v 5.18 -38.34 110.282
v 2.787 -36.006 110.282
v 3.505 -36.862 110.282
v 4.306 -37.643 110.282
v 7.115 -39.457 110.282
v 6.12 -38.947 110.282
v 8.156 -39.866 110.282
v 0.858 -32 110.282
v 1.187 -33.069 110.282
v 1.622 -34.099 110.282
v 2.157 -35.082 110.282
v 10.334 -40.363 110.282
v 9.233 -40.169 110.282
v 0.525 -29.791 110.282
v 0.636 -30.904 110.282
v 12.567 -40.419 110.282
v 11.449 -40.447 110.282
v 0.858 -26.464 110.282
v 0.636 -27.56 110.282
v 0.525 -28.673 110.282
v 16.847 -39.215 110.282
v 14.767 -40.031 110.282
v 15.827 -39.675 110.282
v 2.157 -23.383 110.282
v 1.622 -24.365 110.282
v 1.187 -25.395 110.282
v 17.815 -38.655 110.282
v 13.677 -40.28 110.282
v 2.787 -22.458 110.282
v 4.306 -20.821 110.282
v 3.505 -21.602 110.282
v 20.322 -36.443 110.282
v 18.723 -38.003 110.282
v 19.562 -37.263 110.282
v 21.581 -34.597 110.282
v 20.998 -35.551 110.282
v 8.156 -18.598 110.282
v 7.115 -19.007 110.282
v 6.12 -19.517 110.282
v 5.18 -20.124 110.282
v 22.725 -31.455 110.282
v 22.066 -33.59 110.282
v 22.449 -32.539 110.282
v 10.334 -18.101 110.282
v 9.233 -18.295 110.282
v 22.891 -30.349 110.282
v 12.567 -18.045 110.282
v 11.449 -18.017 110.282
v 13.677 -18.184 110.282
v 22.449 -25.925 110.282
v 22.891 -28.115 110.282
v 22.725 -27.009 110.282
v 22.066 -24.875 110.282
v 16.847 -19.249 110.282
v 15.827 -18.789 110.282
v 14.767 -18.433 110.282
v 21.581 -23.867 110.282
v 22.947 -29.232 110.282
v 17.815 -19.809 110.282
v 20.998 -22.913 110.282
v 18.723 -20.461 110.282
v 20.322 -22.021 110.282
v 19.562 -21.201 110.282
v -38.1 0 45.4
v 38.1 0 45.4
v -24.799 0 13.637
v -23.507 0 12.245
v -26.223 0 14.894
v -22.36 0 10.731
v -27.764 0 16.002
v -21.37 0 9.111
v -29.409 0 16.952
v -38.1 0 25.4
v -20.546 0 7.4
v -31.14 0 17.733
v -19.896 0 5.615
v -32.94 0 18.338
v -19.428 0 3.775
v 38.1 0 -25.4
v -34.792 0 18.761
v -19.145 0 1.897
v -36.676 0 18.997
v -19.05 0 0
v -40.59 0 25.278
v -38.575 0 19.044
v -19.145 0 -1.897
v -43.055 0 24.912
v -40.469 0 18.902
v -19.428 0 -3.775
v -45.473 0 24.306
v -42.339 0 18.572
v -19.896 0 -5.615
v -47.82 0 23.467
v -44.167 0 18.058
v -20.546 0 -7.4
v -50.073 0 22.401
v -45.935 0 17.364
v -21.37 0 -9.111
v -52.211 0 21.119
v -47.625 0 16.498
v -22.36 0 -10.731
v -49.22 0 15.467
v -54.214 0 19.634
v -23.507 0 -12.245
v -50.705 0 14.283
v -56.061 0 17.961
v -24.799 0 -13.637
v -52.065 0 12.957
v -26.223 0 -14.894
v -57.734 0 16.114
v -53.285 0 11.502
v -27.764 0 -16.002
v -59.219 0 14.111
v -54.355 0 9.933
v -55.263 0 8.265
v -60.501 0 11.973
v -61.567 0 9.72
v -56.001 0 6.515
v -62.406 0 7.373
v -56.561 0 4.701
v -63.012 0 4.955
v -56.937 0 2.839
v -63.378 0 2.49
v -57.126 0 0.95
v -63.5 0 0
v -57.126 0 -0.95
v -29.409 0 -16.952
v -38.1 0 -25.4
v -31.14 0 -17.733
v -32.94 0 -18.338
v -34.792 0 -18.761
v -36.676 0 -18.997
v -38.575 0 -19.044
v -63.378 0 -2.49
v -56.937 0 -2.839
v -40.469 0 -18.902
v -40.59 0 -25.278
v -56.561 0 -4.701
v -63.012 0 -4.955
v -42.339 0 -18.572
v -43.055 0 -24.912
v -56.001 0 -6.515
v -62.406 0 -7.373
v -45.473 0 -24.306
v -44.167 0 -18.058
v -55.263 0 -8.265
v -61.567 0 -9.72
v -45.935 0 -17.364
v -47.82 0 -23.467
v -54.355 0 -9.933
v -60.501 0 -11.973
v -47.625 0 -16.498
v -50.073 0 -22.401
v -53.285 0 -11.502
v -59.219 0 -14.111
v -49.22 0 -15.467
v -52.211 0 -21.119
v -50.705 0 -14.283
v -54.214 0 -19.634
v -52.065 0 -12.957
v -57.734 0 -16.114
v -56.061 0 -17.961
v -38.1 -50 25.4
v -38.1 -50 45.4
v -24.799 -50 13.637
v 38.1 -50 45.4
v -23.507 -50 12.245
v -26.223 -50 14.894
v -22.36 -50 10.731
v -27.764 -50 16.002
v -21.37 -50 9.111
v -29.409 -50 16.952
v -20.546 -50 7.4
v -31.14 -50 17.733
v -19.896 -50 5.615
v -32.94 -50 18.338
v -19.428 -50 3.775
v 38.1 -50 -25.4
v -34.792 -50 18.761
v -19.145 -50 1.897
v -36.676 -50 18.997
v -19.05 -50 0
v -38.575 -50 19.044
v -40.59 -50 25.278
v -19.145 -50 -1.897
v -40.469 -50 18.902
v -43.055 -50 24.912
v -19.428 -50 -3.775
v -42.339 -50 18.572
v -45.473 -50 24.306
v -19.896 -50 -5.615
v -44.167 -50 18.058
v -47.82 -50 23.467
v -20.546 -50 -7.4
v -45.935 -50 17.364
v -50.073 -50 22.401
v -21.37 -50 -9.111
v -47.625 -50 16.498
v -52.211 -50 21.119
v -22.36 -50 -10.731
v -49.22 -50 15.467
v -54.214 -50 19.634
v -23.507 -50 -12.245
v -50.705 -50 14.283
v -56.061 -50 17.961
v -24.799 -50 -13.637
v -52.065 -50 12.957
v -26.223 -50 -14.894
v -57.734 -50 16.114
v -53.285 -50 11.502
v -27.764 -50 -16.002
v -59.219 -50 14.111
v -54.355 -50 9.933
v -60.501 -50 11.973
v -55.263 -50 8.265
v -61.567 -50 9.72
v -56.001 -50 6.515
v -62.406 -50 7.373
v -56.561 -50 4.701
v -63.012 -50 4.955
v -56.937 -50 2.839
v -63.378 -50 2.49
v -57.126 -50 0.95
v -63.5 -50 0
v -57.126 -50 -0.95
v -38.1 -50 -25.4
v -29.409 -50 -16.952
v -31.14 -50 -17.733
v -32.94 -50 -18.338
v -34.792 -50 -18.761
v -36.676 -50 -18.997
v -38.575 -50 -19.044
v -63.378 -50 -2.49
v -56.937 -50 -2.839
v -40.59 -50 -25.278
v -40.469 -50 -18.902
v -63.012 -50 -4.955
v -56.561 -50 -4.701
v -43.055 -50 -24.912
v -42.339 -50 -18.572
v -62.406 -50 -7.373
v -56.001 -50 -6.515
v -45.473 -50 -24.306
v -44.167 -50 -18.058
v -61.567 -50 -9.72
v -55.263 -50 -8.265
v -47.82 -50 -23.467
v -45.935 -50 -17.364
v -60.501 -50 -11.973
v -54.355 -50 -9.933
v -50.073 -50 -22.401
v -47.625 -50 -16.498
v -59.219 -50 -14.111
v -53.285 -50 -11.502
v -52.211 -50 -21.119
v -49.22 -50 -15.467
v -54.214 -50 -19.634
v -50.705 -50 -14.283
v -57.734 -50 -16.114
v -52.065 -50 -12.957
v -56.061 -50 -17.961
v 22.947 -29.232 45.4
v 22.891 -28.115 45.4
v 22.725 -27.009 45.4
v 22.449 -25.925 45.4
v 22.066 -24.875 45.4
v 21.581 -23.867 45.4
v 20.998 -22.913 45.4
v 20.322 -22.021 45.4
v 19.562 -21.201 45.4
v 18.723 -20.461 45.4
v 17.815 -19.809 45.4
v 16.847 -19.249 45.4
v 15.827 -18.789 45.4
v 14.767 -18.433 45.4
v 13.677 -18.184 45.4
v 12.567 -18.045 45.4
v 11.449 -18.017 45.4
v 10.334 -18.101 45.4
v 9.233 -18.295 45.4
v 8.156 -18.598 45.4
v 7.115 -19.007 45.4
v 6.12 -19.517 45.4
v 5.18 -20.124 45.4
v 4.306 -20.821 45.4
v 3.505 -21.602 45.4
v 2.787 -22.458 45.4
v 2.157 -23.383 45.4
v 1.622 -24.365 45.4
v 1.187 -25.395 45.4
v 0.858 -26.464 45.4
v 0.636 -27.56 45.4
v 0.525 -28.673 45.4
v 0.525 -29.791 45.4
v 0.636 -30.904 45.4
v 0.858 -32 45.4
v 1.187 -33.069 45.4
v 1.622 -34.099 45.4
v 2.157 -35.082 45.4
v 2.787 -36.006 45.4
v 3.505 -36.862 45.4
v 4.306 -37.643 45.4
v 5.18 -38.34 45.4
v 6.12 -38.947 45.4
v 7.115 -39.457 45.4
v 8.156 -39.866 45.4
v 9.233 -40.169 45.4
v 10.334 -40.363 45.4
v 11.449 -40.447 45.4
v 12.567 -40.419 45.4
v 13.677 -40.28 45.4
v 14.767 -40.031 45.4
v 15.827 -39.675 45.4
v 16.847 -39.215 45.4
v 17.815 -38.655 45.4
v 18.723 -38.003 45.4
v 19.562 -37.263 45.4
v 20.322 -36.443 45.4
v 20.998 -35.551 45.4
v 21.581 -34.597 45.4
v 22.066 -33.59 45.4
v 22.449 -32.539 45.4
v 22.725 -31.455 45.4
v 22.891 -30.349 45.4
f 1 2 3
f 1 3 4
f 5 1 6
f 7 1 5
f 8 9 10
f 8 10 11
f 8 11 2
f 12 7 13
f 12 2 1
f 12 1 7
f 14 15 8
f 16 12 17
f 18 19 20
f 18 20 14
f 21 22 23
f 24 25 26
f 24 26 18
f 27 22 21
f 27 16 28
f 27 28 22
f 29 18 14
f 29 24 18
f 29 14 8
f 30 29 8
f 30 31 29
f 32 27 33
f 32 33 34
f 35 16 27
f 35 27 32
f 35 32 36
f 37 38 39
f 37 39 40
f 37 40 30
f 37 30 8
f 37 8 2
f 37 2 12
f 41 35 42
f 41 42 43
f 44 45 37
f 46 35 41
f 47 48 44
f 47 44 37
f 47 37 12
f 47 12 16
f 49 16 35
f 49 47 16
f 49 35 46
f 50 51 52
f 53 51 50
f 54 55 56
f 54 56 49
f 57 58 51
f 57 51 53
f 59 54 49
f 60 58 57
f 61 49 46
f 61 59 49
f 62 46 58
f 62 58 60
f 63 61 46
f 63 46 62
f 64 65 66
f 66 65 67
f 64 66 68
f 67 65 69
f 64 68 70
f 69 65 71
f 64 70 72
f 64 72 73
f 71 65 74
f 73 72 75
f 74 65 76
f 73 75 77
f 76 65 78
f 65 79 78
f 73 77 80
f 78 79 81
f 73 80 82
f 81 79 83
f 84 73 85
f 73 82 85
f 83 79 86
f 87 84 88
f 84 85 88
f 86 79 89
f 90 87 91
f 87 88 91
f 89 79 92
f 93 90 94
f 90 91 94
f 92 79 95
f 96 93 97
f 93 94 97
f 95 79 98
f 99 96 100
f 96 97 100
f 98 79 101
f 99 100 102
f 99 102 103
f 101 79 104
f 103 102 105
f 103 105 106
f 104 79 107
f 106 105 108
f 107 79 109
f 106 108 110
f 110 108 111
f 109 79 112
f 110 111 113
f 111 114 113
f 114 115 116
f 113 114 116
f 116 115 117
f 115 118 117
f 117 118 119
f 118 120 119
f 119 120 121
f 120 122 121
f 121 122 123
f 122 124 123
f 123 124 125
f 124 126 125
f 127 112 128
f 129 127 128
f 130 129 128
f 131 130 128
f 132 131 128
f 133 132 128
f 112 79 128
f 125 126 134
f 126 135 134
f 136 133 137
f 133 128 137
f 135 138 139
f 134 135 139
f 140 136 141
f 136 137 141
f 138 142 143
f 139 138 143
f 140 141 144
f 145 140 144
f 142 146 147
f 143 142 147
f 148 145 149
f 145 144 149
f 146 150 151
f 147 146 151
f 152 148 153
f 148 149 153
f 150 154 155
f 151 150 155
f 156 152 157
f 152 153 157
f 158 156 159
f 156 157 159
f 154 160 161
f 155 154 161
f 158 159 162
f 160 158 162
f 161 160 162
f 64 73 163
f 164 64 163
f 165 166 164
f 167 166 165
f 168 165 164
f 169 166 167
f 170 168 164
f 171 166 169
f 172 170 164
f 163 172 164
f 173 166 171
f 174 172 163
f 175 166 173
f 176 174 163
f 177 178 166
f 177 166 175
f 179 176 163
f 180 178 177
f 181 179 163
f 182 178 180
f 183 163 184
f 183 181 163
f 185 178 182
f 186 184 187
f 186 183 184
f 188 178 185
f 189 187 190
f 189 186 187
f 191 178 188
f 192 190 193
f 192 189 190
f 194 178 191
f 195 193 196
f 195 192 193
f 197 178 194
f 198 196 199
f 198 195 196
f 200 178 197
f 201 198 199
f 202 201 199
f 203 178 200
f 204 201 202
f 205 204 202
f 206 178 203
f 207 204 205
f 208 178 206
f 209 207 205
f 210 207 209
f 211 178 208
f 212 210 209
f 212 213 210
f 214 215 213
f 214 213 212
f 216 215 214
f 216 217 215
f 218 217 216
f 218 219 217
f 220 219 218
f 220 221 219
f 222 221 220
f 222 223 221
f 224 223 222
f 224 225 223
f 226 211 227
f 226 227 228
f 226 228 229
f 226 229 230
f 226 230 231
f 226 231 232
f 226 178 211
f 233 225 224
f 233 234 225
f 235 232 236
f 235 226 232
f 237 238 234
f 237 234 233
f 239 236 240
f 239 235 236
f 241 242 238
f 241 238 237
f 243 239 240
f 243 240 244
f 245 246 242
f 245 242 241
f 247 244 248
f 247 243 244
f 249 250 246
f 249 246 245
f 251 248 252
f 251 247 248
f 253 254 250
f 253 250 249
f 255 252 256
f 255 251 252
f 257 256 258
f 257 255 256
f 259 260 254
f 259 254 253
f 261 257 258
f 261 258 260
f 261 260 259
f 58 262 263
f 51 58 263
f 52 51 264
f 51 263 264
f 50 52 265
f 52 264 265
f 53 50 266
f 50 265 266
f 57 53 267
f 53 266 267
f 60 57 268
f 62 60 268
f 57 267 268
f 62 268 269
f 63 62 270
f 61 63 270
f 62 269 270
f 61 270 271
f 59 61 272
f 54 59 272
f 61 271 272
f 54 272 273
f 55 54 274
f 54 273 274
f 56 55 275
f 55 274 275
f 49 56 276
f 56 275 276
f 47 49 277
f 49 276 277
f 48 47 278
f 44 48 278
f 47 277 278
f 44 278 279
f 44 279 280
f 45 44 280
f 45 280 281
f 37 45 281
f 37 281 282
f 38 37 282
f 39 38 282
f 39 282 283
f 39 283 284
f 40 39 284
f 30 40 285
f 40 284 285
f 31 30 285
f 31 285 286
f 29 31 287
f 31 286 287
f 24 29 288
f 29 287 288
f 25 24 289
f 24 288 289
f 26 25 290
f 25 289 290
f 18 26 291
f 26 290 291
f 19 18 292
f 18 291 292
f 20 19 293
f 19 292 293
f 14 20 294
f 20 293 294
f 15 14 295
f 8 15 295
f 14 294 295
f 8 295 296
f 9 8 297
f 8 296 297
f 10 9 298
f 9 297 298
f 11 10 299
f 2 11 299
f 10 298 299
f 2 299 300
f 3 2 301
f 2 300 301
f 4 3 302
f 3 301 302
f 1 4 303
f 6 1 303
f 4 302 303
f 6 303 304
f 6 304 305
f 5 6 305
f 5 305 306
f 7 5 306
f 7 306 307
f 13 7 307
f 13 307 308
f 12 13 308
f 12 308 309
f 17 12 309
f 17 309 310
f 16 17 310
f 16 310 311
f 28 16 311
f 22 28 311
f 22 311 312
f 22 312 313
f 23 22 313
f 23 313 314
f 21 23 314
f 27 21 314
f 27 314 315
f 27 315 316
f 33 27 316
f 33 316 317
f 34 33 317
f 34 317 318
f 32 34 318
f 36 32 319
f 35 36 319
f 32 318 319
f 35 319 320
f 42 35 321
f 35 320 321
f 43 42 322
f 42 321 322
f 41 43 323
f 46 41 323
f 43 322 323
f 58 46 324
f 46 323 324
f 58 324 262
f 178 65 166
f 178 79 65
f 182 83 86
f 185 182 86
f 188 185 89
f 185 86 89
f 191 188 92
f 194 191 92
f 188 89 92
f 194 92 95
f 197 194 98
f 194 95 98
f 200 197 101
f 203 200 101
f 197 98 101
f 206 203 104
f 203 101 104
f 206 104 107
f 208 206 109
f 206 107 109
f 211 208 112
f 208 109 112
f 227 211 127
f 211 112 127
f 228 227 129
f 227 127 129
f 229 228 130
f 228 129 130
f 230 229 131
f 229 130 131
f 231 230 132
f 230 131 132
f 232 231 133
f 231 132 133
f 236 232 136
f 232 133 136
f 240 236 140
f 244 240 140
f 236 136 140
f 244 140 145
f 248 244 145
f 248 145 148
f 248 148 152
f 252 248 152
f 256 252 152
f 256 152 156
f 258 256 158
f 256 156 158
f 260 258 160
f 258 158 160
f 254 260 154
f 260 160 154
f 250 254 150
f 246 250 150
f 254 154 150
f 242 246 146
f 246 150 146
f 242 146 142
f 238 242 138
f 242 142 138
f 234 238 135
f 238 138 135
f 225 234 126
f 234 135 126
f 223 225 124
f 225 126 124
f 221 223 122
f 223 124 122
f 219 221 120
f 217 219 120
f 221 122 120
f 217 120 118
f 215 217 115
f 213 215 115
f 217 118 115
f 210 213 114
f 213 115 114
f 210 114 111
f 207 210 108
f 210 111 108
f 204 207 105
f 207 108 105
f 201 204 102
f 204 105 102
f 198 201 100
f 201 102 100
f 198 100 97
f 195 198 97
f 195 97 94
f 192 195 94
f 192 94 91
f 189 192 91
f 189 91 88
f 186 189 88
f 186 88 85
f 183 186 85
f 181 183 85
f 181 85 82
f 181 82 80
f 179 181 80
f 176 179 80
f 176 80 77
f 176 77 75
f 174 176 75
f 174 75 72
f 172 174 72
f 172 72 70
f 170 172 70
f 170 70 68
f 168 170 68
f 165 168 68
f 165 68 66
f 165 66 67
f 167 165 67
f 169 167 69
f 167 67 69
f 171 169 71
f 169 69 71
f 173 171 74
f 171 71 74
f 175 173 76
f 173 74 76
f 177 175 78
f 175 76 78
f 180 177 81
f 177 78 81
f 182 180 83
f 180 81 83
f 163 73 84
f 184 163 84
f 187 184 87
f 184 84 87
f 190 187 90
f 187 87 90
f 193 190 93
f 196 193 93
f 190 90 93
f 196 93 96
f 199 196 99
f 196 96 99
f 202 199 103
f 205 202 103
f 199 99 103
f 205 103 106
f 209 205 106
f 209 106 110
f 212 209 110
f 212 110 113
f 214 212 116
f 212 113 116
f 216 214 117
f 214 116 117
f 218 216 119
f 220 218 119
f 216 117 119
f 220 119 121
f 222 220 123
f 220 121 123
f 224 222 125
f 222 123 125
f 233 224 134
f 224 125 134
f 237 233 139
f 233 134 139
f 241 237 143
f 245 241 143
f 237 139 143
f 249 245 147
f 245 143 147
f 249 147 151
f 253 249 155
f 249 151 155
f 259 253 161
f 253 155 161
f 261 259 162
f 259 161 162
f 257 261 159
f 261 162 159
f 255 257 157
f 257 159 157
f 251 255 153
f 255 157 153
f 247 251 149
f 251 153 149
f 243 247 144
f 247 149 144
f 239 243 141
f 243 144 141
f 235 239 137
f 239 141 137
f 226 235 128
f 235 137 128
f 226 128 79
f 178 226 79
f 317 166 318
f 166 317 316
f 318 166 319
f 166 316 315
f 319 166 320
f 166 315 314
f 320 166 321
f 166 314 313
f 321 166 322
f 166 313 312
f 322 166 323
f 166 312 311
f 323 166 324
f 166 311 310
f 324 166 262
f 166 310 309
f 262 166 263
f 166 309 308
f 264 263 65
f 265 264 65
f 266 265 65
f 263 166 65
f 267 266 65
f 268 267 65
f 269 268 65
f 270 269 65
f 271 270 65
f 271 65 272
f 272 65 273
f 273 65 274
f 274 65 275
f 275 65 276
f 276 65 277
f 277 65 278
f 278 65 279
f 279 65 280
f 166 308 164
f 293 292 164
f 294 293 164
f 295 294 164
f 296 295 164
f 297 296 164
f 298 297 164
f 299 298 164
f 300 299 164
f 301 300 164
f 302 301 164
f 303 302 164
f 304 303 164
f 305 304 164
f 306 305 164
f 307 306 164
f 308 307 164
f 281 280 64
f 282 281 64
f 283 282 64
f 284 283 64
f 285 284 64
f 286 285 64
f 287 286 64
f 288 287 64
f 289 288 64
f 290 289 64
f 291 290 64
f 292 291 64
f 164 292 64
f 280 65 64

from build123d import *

# Parameters (mm, degrees)
F1_DEPTH = 50
F2_DEPTH = 20
F3_R     = 11.2180769553
F4_DEPTH = 64.881876111


with BuildPart() as f1:
    # F0 (on Front) → F1 (new body)
    with BuildSketch(Plane.XZ):
        with BuildLine():
            Line((-38.1, -25.4), (38.1, -25.4))
            Line((38.1, -25.4), (38.1, 25.4))
            Line((38.1, 25.4), (-38.1, 25.4))
            ThreePointArc((-38.1, 25.4), (-20.1394877579, 17.9605122421), (-12.7, 0))
            ThreePointArc((-12.7, 0), (-20.1394877579, -17.9605122421), (-38.1, -25.4))
        make_face()
        with BuildLine():
            ThreePointArc((-38.1, 25.4), (-63.5, 0), (-38.1, -25.4))
            Line((-38.1, -25.4), (-38.1, -19.05))
            ThreePointArc((-38.1, -19.05), (-57.15, 0), (-38.1, 19.05))
            Line((-38.1, 19.05), (-38.1, 25.4))
        make_face()
        with BuildLine():
            Line((-38.1, -19.05), (-38.1, -25.4))
            ThreePointArc((-38.1, -25.4), (-20.1394877579, -17.9605122421), (-12.7, 0))
            ThreePointArc((-12.7, 0), (-20.1394877579, 17.9605122421), (-38.1, 25.4))
            Line((-38.1, 25.4), (-38.1, 19.05))
            ThreePointArc((-38.1, 19.05), (-24.6296158184, 13.4703841816), (-19.05, 0))
            ThreePointArc((-19.05, 0), (-24.6296158184, -13.4703841816), (-38.1, -19.05))
        make_face()
    extrude(amount=F1_DEPTH)

    # F2 (add): a face of the model
    f2_faces = [f1.faces().sort_by_distance(p)[0] for p in [
        (0, -25, 25.4),
    ]]
    extrude(f2_faces, amount=F2_DEPTH)

    # F3 (on face) → F4 (join)
    with BuildSketch(Plane.XY.offset(45.4)):
        with Locations((11.7288976908, -29.2320102453)):
            Circle(F3_R)
    extrude(amount=F4_DEPTH)


solid = f1.part
